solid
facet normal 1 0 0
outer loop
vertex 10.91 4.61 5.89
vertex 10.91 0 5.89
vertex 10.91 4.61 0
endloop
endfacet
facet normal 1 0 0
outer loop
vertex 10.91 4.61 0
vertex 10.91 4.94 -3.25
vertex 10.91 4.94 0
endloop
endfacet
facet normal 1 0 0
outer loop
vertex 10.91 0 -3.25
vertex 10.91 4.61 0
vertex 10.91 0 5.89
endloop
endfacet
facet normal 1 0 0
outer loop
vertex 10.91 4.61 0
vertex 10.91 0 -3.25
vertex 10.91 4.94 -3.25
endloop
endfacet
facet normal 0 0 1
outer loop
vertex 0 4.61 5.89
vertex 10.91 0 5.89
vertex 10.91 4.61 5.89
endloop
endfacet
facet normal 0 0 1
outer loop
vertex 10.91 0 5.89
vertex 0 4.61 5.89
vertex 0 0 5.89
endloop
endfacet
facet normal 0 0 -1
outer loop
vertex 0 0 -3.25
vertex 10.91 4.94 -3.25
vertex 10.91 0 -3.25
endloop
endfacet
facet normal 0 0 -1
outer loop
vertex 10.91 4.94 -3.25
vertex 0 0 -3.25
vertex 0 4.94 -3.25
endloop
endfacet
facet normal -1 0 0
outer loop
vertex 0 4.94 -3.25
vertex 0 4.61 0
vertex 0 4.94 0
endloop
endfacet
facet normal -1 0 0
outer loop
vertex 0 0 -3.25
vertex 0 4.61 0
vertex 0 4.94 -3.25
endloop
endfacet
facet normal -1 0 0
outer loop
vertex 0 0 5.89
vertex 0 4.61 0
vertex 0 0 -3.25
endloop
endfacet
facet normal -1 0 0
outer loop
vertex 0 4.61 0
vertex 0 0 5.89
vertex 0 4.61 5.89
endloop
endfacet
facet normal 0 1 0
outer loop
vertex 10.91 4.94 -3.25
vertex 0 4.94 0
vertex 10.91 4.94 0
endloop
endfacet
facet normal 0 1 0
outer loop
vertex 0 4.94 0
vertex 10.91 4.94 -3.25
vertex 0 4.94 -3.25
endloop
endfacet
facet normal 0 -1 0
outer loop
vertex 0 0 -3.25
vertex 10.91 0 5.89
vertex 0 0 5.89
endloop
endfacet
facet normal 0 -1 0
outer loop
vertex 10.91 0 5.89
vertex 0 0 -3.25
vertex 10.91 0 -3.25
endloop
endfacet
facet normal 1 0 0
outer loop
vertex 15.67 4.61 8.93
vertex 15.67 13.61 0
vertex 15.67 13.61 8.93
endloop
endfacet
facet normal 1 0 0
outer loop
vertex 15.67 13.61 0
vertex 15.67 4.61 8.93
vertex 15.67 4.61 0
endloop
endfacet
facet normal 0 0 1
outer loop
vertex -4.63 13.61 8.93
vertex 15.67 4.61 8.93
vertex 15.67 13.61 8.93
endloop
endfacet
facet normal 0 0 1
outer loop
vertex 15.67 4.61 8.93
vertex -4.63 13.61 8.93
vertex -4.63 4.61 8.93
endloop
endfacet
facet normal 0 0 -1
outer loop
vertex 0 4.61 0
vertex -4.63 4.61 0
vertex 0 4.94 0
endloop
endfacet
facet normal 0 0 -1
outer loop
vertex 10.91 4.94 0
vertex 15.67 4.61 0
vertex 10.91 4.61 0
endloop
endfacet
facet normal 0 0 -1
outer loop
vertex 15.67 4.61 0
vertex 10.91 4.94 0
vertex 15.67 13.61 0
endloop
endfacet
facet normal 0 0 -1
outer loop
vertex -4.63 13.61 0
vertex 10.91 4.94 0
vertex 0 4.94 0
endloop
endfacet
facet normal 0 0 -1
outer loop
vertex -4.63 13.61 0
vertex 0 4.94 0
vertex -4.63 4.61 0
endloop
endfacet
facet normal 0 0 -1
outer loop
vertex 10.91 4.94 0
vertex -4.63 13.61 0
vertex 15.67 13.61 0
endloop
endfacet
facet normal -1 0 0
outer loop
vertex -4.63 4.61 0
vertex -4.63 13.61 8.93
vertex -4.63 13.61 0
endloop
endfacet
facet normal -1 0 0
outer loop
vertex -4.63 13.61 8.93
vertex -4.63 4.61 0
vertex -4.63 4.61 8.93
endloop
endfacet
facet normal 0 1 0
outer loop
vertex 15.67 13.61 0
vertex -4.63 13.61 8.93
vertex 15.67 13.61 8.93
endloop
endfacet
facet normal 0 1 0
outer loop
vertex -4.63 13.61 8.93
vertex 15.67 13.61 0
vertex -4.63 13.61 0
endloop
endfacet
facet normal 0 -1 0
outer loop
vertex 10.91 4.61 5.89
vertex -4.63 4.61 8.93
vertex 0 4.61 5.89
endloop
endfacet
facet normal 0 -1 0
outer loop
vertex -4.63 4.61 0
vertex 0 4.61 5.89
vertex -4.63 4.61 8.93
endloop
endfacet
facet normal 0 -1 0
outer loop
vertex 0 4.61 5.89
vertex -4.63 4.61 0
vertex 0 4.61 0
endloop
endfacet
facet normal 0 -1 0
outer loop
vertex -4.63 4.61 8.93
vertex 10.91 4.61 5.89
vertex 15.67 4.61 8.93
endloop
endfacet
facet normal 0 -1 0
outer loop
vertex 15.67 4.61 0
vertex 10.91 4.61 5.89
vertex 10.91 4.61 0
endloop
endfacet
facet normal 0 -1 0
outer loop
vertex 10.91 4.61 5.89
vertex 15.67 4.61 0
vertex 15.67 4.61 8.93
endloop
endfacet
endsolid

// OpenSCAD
//
// This is a collection of connector cutouts for panels.
//

//--------------------------------------------------------------------------------------
// Dimensions for D-Sub connectors from http://www.interfacebus.com/Connector_D-Sub_Mechanical_Dimensions.html
// Since the cutouts are intended for either gender connector and since 3-D printer holes tend to be a little
// smaller than specified, the maximum tolerance sizes are used.  These may be tweaked if they turn out to
// still be a little too small.
//
// The coordinate origin is at the center of the connector.
//
// The dimensions of interest are:
// C - Distance between mounting holes.  The connector is assumed to be centered between them
// H - Horizontal size of cutout
// J - Vertical size of cutout
//
// Other dimensions that don't depend on the specific connector:
// Corner radius - 0.062 inches
// Screw hole size - 0.125 inches
//
// Dimension table
// Size   C      H      J
//   1  24.87  19.53  10.97
//   2  33.45  27.76  10.97
//   3  47.17  41.53  10.97
//   4  63.63  57.96  10.97
//   5  61.24  55.58  13.82
//   6  63.63  58.72  15.39
//
// Pins per connector
// Size  Standard  Dense
//    1     9        15
//    2    15        26
//    3    25        44
//    4    37        62
//    5    50        78
//    6   104       n/a
//
module bbs_d_cutout(size, height)
{
    if ((size < 1) || (size > 6))
    {
        echo("bbs_connectors.scad Invalid size given for D-sub connector ", size);
//        assert(false); // Assert may not be supported yet
    }
    screw_rad = 0.125 * 25.4/2;
    corner_rad = 0.063 * 25.4;
    c_sizes = [24.87, 33.45, 47.17, 63.63, 61.24, 63.63];
    h_sizes = [19.53, 27.76, 41.53, 57.96, 55.59, 58.72];
    j_sizes = [10.97, 10.97, 10.97, 10.97, 13.82, 15.39];
    size_c = c_sizes[size - 1];
    size_h = h_sizes[size - 1] + 1.5;
    size_j = j_sizes[size - 1] + 1.0;
    union()
    {
        translate([-size_c/2, 0, 0]) cylinder(r = screw_rad, h = height, $fn=20);
        translate([size_c/2, 0, 0]) cylinder(r = screw_rad, h = height, $fn=20);
        minkowski()
        {
            linear_extrude(height = height/2)
                polygon(points=[[-size_h/2+corner_rad, -size_j/2+corner_rad],
                    [size_h/2-corner_rad, -size_j/2+corner_rad], 
                    [size_h/2-corner_rad-sin(10)*size_j, size_j/2-corner_rad],
                    [-size_h/2+corner_rad+sin(10)*size_j, size_j/2-corner_rad]]);
            cylinder(r=corner_rad, h=height/2, $fn=20);
        }
    }
}

//--------------------------------------------------------------------------------------
//  These are like bannana connectors, but are a smaller diameter.  I have a bag of them
// from some unknown source.  I did find them at Digi-Key - search for tip connectors.
// As with most things at Digi-Key, there is a bewildering variaty of them and you will
// need to narrow down just what you need.  These are also cheaper than bannana connectors,
// which is probably why I have a bag of them.
//
module bbs_tip_connector()
{
    union()
    {
        cylinder(r=9.41/2, h=4.8);
        translate([0, 0, -14.19]) cylinder(r=6.22/2, h=14.19);
        translate([0, 0, -21.83]) cylinder(r=2.35/2, h=21.83);
    }
}

module bbs_tip_connector_cutout(height)
{
    intersection()
    {
        cylinder(r=6.32/2, h=height, $fn=20);
        translate([-6.32/2, -5.4/2, 0]) cube([6.32, 5.4, height]);
    }
}

//--------------------------------------------------------------------------------------
// Models and cutouts for Bannana jacks.  These are ubiquitous in lab equipment.
//
module bbs_bannana_connector()
{
    union()
    {
        cylinder(r=11.15/2, h=4.7);
        translate([0, 0, -11.91]) cylinder(r=7.78/2, h=11.91);
        translate([0, 0, -19.16]) cylinder(r=4.73/2, h=19.16);
    }
}
module bbs_bannana_connector_cutout(height)
{
    radius=8.07/2;
    width=6.3;
//    intersection()
//    {
//        cylinder(r=radius, h=height, $fn=20);
//        translate([-radius, -width/2, 0]) cube([radius*2, width, height]);
//    }
    difference()
    {
        cylinder(r=radius, h=height, $fn=20);
        union()
        {
            translate([-radius, -radius, -0.1]) cube([radius*2, radius - (width/2), height+0.2]);
            translate([-radius, (width/2), -0.1]) cube([radius*2, radius - (width/2), height+0.2]);
        }
    }
}
//
// Standard spacing between bannana connectors.
//
function bbs_bannana_connector_spacing() = 19.05;

//--------------------------------------------------------------------------------------
// This is a cutout for a panel mounted Rj45 connector (AdaFruit p/n 909)
//
module bbs_rj45_panel_cutout(height)
{
  radius = 3.4/2;
  width = 15.66;
  offset = 2.76 + radius + width/2;
  tall = 14.00;
  union()
  {
    translate([-offset, 0, 0]) cylinder(r=radius, h = height, $fn=20);
    translate([offset, 0, 0]) cylinder(r=radius, h = height, $fn=20);
    translate([-width/2, -tall/2, 0]) cube([width, tall, height]);
  }
}

//--------------------------------------------------------------------------------------
// These are cutouts for panel mounted USB connectors.
//
// USB B to micro USB (AdaFruit p/n 937)
module bbs_usb_b_cutout(height)
{
  radius = 3/2;
  width = 12.06;
  tall = 11.20;
  offset = 25.56/2 + radius;
  union()
  {
    translate([-offset, 0, 0]) cylinder(r=radius, h = height, $fn=20);
    translate([offset, 0, 0]) cylinder(r=radius, h = height, $fn=20);
    translate([-width/2, -tall/2, 0]) cube([width, tall, height]);
  }
}

// Micro USB to micro USB (AdaFruit p/n 3258)
module bbs_micro_usb_cutout(height)
{
  radius = 3/2;
  width = 9.08;
  tall = 4.61;
  offset = 13.75/2 + radius;
  union()
  {
    translate([-offset, 0, 0]) cylinder(r=radius, h = height, $fn=20);
    translate([offset, 0, 0]) cylinder(r=radius, h = height, $fn=20);
    translate([-width/2, -tall/2, 0]) cube([width, tall, height]);
  }
}

//--------------------------------------------------------------------------------------
// These are Multipin connectors.
//
//  Two rows of 5 pins, right angle connector
module bbs_2x5_rt()
{
  union()
  {
    translate([0, 0, -3.25]) color("silver") cube([10.91, 4.94, 9.14]);
    translate([-4.63, 4.61, 0]) color("black") cube([20.30, 9.00, 8.93]);
  }
}
//--------------------------------------------------------------------------------------
bbs_2x5_rt();
//bbs_d_cutout(1, 2);
//translate([0, 15, 0]) bbs_tip_connector_cutout(2);
//translate([10, 15, 0]) bbs_tip_connector();
//translate([0, 30, 0]) bbs_bannana_connector_cutout(2);
//translate([10, 30, 0]) bbs_bannana_connector();
//translate([0, 45, 0]) bbs_rj45_panel_cutout(2);
//translate([0, 60, 0]) bbs_usb_b_cutout(2);
//translate([0, 75, 0]) bbs_micro_usb_cutout(2);
